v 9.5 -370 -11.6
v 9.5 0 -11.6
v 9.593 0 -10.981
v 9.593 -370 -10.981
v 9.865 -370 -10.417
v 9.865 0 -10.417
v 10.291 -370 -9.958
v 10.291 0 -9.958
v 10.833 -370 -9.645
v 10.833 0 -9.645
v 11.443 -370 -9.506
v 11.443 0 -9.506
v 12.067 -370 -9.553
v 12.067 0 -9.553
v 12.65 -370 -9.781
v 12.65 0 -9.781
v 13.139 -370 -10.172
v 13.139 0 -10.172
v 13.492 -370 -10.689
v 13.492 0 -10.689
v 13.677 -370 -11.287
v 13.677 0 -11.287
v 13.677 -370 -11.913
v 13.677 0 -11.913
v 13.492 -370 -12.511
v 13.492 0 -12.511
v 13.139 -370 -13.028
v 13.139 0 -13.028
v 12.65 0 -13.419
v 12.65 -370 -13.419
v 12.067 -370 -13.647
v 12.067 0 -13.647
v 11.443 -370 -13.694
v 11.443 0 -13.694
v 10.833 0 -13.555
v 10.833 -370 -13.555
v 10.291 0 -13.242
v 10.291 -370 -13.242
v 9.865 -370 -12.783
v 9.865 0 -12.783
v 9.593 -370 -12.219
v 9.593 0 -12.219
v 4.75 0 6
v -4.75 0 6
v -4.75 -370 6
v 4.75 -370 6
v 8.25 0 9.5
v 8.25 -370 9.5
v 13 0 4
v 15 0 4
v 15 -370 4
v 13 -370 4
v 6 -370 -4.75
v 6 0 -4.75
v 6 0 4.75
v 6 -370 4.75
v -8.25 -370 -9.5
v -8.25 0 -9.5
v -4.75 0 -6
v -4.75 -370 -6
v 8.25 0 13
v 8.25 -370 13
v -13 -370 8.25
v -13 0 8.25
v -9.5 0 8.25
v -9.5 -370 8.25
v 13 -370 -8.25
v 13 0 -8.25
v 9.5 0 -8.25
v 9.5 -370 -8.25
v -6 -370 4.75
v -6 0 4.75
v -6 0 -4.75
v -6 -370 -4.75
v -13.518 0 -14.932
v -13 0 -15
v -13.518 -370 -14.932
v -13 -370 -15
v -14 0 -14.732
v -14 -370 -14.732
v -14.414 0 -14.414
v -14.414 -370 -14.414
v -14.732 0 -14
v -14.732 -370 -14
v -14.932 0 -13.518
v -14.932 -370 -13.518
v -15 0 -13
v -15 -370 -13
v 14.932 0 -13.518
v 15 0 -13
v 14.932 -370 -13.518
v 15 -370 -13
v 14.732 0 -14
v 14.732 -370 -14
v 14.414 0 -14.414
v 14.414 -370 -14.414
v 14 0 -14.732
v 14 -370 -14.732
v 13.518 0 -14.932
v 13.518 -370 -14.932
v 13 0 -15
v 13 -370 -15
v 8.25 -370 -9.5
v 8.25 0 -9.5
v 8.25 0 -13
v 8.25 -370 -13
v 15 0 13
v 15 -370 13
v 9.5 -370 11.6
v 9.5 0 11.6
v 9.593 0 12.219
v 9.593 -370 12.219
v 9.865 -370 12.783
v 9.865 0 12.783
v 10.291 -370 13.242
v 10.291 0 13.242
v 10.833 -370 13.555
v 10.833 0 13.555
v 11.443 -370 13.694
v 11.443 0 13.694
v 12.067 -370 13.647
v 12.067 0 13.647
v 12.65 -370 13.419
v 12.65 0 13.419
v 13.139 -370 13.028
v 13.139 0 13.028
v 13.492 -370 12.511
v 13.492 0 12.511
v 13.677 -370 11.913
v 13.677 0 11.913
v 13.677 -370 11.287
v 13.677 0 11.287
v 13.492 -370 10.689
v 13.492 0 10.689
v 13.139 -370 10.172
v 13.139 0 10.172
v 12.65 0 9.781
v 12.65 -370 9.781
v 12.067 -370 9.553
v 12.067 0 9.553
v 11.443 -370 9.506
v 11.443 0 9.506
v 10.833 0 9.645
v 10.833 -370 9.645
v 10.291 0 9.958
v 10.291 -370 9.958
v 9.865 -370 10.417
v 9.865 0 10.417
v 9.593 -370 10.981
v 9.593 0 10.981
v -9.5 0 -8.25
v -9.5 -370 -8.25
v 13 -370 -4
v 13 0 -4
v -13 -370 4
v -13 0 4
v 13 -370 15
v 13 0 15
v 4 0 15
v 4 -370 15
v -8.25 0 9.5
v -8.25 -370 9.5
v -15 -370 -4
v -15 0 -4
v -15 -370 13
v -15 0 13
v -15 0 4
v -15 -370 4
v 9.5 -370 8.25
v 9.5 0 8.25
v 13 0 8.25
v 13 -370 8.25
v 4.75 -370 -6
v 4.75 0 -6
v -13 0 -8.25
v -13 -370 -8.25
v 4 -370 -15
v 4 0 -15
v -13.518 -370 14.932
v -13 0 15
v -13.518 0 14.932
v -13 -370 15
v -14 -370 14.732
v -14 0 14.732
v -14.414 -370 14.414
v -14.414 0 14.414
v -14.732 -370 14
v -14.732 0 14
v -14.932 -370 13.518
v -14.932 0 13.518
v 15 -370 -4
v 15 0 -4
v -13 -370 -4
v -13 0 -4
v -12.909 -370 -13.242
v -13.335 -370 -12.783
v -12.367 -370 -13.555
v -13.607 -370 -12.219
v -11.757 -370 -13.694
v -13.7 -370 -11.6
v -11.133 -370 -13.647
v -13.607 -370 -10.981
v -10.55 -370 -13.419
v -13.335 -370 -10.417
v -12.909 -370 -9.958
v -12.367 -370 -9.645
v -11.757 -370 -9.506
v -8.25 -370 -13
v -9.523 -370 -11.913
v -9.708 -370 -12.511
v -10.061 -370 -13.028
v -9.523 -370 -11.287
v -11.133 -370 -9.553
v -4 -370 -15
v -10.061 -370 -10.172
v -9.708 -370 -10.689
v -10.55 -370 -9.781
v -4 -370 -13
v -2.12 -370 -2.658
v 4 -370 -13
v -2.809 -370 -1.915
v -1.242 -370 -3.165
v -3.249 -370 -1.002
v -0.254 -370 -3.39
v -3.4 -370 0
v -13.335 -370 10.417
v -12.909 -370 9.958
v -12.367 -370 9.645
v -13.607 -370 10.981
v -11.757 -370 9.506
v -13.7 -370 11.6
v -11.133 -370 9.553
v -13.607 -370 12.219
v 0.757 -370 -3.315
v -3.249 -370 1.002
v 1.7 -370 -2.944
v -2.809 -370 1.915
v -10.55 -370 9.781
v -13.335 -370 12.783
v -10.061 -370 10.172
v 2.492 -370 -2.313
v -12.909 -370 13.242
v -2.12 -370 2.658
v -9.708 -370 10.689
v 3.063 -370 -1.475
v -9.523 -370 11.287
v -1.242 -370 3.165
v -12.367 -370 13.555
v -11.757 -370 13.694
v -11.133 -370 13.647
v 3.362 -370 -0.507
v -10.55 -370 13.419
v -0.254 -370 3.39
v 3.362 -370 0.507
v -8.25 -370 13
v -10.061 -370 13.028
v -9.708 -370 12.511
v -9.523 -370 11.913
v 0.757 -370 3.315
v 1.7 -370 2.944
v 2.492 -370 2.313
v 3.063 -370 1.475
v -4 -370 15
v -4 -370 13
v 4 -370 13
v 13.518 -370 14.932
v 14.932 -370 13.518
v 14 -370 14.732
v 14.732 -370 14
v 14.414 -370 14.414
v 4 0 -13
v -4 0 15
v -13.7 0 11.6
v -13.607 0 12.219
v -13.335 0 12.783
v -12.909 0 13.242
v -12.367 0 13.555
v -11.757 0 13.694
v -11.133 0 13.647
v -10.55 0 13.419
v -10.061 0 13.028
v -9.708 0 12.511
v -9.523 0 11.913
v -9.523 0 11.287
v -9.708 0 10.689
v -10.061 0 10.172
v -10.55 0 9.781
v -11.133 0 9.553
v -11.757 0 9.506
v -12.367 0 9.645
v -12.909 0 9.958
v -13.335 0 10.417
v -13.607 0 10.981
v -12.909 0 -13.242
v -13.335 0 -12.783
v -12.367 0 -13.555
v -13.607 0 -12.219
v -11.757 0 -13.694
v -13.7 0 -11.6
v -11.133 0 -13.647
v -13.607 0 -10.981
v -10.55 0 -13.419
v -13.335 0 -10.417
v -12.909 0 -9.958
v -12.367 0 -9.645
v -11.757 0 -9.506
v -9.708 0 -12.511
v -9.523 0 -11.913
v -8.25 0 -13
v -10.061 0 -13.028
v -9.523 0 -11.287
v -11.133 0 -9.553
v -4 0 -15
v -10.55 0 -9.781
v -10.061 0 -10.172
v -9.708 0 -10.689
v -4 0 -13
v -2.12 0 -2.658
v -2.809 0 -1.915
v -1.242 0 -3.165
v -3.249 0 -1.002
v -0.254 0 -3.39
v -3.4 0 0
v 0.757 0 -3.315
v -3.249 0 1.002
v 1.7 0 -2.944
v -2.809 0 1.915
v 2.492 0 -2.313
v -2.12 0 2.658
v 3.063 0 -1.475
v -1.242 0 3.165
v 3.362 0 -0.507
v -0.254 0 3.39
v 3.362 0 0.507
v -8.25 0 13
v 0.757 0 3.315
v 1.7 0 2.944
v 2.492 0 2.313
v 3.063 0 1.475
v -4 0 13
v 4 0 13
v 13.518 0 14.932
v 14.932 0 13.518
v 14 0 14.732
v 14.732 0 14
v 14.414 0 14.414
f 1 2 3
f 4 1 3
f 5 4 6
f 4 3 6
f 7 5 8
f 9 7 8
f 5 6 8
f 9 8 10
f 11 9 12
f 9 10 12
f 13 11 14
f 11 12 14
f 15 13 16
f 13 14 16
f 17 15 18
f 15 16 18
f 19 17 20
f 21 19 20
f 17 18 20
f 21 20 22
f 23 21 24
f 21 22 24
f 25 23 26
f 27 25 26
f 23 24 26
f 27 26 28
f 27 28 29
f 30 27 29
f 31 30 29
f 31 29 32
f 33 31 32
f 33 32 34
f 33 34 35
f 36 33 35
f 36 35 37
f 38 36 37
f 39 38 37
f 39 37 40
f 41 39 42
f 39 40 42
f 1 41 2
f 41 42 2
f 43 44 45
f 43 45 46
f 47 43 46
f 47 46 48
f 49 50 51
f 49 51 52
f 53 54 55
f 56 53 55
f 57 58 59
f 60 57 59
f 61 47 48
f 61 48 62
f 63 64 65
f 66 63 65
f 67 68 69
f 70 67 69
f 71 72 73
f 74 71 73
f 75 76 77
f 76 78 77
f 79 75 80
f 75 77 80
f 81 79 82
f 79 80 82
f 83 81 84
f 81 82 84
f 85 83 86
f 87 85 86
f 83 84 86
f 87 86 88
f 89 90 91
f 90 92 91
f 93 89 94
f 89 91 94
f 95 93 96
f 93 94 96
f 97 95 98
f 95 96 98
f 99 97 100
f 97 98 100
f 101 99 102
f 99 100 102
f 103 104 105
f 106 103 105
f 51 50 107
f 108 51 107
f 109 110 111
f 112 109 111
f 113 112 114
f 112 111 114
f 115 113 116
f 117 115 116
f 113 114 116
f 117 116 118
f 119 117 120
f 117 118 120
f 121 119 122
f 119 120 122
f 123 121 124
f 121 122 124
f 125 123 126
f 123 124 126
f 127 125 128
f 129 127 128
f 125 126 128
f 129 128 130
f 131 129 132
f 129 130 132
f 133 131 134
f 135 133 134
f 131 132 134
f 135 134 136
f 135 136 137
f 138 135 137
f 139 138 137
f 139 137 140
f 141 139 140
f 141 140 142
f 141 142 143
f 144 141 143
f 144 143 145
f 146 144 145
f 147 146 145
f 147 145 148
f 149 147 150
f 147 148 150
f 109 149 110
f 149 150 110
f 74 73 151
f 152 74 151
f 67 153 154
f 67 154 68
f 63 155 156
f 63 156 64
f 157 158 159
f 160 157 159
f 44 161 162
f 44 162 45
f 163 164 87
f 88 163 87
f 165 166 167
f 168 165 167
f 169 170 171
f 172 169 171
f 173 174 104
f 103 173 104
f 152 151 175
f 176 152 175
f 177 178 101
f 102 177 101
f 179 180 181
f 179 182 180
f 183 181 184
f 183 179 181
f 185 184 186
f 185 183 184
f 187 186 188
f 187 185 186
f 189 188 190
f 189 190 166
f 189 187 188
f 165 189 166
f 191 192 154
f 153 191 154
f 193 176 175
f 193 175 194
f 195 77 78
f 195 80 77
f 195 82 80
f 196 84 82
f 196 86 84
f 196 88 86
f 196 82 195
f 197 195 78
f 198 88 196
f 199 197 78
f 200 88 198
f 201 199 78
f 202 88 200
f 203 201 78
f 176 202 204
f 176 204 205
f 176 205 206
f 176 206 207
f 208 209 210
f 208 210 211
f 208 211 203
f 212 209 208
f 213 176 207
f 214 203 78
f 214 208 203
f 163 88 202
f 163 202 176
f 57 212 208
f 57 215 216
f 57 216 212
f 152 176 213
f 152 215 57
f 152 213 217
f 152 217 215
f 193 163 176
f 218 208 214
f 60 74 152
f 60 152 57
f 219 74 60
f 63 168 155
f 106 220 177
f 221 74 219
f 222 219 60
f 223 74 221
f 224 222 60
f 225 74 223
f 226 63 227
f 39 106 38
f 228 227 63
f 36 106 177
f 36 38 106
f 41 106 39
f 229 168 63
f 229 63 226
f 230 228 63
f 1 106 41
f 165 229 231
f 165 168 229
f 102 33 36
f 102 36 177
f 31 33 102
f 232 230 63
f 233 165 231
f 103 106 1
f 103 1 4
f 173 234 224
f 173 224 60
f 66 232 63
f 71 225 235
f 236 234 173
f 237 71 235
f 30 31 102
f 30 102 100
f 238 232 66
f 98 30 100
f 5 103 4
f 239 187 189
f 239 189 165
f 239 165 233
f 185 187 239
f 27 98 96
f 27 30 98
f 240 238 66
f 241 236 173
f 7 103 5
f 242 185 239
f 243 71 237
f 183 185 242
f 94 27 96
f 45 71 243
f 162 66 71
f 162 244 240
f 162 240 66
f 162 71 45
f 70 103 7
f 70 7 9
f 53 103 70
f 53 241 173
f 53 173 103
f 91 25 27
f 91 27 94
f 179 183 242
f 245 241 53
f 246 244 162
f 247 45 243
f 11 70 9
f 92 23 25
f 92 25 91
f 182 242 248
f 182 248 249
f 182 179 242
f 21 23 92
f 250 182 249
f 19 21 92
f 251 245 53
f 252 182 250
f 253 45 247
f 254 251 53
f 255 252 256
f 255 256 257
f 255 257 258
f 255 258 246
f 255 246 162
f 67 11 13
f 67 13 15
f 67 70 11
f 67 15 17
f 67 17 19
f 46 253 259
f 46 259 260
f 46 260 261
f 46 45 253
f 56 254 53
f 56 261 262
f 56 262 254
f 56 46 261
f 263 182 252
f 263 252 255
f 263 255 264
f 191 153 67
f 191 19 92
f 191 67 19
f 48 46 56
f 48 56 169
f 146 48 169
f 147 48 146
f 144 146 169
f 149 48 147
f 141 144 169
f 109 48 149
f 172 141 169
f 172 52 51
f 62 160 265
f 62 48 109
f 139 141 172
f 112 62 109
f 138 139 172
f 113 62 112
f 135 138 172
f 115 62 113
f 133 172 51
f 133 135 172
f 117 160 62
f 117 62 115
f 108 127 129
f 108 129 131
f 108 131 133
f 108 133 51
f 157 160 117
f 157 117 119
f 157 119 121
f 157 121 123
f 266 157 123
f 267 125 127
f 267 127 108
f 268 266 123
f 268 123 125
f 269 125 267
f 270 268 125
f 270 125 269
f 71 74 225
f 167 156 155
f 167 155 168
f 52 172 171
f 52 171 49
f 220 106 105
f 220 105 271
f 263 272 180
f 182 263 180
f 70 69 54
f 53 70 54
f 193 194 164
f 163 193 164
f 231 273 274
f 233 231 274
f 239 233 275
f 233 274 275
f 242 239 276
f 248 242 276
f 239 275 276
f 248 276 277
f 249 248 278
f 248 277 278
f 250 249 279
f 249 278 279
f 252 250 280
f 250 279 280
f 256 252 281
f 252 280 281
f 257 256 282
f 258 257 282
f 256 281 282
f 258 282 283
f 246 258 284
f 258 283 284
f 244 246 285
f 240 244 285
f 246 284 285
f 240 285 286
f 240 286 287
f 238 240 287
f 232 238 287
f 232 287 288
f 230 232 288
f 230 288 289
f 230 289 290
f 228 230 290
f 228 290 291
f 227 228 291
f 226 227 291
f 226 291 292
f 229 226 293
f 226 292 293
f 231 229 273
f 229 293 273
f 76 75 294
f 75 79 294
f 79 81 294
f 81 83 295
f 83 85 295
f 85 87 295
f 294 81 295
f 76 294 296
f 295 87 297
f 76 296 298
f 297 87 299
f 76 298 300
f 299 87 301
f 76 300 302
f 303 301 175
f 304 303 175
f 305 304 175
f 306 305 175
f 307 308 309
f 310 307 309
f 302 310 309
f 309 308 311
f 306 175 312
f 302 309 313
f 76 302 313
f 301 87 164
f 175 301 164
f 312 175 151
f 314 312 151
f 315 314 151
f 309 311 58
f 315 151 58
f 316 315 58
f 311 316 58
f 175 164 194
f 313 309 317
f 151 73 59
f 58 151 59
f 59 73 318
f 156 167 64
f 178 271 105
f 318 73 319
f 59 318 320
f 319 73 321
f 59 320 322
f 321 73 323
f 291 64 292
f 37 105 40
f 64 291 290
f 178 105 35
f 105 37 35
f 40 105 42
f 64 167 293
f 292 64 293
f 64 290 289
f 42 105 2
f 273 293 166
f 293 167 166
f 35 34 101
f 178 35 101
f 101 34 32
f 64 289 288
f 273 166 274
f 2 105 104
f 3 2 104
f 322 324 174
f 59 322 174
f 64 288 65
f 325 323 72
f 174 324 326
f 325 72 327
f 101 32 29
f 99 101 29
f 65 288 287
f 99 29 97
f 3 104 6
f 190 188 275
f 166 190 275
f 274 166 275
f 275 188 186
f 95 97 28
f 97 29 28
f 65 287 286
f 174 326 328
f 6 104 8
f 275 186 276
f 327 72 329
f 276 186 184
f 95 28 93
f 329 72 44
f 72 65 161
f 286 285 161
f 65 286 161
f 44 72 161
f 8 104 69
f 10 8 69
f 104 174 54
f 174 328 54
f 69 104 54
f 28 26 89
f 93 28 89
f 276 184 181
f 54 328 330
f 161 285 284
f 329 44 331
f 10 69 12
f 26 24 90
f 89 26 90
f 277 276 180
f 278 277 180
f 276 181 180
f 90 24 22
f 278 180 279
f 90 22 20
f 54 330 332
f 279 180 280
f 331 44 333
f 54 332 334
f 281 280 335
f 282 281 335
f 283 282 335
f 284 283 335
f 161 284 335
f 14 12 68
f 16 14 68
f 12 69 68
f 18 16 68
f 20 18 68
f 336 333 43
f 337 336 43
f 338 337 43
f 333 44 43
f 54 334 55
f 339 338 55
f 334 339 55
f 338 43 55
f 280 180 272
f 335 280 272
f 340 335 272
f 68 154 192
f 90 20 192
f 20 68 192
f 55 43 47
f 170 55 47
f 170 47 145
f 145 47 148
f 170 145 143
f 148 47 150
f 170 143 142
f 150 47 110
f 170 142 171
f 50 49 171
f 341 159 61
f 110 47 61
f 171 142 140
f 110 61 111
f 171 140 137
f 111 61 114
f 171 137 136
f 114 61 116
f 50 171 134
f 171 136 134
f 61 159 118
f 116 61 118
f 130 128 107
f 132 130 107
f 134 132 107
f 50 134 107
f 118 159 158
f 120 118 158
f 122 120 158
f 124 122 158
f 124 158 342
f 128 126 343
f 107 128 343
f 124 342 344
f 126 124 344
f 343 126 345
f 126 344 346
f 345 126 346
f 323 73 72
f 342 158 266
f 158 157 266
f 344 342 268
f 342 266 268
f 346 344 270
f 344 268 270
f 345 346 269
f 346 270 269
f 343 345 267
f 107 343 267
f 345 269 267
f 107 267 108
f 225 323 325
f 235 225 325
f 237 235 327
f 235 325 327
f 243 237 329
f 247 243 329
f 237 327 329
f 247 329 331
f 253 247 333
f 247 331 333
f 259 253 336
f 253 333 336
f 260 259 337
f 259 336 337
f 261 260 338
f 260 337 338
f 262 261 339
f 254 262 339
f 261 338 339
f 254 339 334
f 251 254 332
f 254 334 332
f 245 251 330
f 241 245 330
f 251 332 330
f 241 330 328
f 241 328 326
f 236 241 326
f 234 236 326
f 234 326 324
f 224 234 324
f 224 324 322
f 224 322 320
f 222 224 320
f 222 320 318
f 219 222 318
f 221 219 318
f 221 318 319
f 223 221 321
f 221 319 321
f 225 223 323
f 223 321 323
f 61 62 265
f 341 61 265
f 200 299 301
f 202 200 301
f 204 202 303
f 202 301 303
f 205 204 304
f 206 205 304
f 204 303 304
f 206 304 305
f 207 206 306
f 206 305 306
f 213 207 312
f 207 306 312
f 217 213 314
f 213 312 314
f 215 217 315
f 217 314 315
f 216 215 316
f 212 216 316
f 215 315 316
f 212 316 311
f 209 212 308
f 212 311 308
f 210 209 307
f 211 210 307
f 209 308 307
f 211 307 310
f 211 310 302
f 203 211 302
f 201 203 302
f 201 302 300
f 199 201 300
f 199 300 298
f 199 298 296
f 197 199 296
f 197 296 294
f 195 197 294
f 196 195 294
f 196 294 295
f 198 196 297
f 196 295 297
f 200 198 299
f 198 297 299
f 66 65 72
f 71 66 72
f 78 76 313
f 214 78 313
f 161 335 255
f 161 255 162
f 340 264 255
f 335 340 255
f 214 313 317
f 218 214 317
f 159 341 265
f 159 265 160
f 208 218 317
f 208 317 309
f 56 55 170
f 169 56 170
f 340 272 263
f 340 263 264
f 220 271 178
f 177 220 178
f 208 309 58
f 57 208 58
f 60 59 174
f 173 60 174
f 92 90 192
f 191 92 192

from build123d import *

# Parameters (mm, degrees)
F1_DEPTH = 370
F2_DEPTH = 400
F3_W     = 18.6485039899
F3_H     = 8
F3_W_2   = 19.9612321942
F3_R     = 3.4
F3_R_2   = 2.1
F4_DEPTH = 370
F5_R     = 2


# Not quite as in the source:
# - a pattern or mirror of a feature is missing from the dataset's text; its kind, count and spacing are read off the source's solid


with BuildPart() as f1:
    # F0 (on Front) → F1 (new body)
    with BuildSketch(Plane.XZ):
        Polygon((15, -15), (15, 15), (4, 15), (4, 13), (8.25, 13), (8.25, 9.5), (4.75, 6), (-4.75, 6), (-8.25, 9.5), (-8.25, 13), (-4, 13), (-4, 15), (-15, 15), (-15, -15), align=None)
        Polygon((4, 13), (4, 15), (-4, 15), (-4, 13), (-8.25, 13), (-8.25, 9.5), (-4.75, 6), (4.75, 6), (8.25, 9.5), (8.25, 13), align=None)
    extrude(amount=F1_DEPTH)

    # F0 (on Front) → F2 (cut)
    with BuildSketch(Plane.XZ):
        Polygon((4, 13), (4, 15), (-4, 15), (-4, 13), (-8.25, 13), (-8.25, 9.5), (-4.75, 6), (4.75, 6), (8.25, 9.5), (8.25, 13), align=None)
    f2 = extrude(amount=F2_DEPTH, mode=Mode.SUBTRACT)

    # F2_copies: F2 across plane
    add(f2.mirror(Plane(origin=(0, 0, 0), x_dir=(-1, 0, 0), z_dir=(0, 0, -1))), mode=Mode.SUBTRACT)

    # F3 (on face) → F4 (cut)
    with BuildSketch(Plane(origin=(0, 0, 0), x_dir=(-1, 0, 0), z_dir=(0, 1, 0))):
        Polygon((-6, 4.75), (-9.5, 8.25), (-13, 8.25), (-13, 4), (-13, -4), (-13, -8.25), (-9.5, -8.25), (-6, -4.75), align=None)
        with Locations((-22.3242519949, 0)):
            Rectangle(F3_W, F3_H)
        Polygon((13, 8.25), (9.5, 8.25), (6, 4.75), (6, -4.75), (9.5, -8.25), (13, -8.25), (13, -4), (13, 4), align=None)
        with Locations((22.9806160971, 0)):
            Rectangle(F3_W_2, F3_H)
        Circle(F3_R)
        with Locations((-11.6, 11.6)):
            Circle(F3_R_2)
        with Locations((-11.6, -11.6)):
            Circle(F3_R_2)
        with Locations((11.6, -11.6)):
            Circle(F3_R_2)
        with Locations((11.6, 11.6)):
            Circle(F3_R_2)
    extrude(amount=-F4_DEPTH, mode=Mode.SUBTRACT)

    # F5
    f5_edges = [f1.edges().sort_by_distance(p)[0] for p in [
        (-15, -185, 15),
        (-15, -185, -15),
        (15, -185, -15),
        (15, -185, 15),
    ]]
    fillet(f5_edges, radius=F5_R)


solid = f1.part
